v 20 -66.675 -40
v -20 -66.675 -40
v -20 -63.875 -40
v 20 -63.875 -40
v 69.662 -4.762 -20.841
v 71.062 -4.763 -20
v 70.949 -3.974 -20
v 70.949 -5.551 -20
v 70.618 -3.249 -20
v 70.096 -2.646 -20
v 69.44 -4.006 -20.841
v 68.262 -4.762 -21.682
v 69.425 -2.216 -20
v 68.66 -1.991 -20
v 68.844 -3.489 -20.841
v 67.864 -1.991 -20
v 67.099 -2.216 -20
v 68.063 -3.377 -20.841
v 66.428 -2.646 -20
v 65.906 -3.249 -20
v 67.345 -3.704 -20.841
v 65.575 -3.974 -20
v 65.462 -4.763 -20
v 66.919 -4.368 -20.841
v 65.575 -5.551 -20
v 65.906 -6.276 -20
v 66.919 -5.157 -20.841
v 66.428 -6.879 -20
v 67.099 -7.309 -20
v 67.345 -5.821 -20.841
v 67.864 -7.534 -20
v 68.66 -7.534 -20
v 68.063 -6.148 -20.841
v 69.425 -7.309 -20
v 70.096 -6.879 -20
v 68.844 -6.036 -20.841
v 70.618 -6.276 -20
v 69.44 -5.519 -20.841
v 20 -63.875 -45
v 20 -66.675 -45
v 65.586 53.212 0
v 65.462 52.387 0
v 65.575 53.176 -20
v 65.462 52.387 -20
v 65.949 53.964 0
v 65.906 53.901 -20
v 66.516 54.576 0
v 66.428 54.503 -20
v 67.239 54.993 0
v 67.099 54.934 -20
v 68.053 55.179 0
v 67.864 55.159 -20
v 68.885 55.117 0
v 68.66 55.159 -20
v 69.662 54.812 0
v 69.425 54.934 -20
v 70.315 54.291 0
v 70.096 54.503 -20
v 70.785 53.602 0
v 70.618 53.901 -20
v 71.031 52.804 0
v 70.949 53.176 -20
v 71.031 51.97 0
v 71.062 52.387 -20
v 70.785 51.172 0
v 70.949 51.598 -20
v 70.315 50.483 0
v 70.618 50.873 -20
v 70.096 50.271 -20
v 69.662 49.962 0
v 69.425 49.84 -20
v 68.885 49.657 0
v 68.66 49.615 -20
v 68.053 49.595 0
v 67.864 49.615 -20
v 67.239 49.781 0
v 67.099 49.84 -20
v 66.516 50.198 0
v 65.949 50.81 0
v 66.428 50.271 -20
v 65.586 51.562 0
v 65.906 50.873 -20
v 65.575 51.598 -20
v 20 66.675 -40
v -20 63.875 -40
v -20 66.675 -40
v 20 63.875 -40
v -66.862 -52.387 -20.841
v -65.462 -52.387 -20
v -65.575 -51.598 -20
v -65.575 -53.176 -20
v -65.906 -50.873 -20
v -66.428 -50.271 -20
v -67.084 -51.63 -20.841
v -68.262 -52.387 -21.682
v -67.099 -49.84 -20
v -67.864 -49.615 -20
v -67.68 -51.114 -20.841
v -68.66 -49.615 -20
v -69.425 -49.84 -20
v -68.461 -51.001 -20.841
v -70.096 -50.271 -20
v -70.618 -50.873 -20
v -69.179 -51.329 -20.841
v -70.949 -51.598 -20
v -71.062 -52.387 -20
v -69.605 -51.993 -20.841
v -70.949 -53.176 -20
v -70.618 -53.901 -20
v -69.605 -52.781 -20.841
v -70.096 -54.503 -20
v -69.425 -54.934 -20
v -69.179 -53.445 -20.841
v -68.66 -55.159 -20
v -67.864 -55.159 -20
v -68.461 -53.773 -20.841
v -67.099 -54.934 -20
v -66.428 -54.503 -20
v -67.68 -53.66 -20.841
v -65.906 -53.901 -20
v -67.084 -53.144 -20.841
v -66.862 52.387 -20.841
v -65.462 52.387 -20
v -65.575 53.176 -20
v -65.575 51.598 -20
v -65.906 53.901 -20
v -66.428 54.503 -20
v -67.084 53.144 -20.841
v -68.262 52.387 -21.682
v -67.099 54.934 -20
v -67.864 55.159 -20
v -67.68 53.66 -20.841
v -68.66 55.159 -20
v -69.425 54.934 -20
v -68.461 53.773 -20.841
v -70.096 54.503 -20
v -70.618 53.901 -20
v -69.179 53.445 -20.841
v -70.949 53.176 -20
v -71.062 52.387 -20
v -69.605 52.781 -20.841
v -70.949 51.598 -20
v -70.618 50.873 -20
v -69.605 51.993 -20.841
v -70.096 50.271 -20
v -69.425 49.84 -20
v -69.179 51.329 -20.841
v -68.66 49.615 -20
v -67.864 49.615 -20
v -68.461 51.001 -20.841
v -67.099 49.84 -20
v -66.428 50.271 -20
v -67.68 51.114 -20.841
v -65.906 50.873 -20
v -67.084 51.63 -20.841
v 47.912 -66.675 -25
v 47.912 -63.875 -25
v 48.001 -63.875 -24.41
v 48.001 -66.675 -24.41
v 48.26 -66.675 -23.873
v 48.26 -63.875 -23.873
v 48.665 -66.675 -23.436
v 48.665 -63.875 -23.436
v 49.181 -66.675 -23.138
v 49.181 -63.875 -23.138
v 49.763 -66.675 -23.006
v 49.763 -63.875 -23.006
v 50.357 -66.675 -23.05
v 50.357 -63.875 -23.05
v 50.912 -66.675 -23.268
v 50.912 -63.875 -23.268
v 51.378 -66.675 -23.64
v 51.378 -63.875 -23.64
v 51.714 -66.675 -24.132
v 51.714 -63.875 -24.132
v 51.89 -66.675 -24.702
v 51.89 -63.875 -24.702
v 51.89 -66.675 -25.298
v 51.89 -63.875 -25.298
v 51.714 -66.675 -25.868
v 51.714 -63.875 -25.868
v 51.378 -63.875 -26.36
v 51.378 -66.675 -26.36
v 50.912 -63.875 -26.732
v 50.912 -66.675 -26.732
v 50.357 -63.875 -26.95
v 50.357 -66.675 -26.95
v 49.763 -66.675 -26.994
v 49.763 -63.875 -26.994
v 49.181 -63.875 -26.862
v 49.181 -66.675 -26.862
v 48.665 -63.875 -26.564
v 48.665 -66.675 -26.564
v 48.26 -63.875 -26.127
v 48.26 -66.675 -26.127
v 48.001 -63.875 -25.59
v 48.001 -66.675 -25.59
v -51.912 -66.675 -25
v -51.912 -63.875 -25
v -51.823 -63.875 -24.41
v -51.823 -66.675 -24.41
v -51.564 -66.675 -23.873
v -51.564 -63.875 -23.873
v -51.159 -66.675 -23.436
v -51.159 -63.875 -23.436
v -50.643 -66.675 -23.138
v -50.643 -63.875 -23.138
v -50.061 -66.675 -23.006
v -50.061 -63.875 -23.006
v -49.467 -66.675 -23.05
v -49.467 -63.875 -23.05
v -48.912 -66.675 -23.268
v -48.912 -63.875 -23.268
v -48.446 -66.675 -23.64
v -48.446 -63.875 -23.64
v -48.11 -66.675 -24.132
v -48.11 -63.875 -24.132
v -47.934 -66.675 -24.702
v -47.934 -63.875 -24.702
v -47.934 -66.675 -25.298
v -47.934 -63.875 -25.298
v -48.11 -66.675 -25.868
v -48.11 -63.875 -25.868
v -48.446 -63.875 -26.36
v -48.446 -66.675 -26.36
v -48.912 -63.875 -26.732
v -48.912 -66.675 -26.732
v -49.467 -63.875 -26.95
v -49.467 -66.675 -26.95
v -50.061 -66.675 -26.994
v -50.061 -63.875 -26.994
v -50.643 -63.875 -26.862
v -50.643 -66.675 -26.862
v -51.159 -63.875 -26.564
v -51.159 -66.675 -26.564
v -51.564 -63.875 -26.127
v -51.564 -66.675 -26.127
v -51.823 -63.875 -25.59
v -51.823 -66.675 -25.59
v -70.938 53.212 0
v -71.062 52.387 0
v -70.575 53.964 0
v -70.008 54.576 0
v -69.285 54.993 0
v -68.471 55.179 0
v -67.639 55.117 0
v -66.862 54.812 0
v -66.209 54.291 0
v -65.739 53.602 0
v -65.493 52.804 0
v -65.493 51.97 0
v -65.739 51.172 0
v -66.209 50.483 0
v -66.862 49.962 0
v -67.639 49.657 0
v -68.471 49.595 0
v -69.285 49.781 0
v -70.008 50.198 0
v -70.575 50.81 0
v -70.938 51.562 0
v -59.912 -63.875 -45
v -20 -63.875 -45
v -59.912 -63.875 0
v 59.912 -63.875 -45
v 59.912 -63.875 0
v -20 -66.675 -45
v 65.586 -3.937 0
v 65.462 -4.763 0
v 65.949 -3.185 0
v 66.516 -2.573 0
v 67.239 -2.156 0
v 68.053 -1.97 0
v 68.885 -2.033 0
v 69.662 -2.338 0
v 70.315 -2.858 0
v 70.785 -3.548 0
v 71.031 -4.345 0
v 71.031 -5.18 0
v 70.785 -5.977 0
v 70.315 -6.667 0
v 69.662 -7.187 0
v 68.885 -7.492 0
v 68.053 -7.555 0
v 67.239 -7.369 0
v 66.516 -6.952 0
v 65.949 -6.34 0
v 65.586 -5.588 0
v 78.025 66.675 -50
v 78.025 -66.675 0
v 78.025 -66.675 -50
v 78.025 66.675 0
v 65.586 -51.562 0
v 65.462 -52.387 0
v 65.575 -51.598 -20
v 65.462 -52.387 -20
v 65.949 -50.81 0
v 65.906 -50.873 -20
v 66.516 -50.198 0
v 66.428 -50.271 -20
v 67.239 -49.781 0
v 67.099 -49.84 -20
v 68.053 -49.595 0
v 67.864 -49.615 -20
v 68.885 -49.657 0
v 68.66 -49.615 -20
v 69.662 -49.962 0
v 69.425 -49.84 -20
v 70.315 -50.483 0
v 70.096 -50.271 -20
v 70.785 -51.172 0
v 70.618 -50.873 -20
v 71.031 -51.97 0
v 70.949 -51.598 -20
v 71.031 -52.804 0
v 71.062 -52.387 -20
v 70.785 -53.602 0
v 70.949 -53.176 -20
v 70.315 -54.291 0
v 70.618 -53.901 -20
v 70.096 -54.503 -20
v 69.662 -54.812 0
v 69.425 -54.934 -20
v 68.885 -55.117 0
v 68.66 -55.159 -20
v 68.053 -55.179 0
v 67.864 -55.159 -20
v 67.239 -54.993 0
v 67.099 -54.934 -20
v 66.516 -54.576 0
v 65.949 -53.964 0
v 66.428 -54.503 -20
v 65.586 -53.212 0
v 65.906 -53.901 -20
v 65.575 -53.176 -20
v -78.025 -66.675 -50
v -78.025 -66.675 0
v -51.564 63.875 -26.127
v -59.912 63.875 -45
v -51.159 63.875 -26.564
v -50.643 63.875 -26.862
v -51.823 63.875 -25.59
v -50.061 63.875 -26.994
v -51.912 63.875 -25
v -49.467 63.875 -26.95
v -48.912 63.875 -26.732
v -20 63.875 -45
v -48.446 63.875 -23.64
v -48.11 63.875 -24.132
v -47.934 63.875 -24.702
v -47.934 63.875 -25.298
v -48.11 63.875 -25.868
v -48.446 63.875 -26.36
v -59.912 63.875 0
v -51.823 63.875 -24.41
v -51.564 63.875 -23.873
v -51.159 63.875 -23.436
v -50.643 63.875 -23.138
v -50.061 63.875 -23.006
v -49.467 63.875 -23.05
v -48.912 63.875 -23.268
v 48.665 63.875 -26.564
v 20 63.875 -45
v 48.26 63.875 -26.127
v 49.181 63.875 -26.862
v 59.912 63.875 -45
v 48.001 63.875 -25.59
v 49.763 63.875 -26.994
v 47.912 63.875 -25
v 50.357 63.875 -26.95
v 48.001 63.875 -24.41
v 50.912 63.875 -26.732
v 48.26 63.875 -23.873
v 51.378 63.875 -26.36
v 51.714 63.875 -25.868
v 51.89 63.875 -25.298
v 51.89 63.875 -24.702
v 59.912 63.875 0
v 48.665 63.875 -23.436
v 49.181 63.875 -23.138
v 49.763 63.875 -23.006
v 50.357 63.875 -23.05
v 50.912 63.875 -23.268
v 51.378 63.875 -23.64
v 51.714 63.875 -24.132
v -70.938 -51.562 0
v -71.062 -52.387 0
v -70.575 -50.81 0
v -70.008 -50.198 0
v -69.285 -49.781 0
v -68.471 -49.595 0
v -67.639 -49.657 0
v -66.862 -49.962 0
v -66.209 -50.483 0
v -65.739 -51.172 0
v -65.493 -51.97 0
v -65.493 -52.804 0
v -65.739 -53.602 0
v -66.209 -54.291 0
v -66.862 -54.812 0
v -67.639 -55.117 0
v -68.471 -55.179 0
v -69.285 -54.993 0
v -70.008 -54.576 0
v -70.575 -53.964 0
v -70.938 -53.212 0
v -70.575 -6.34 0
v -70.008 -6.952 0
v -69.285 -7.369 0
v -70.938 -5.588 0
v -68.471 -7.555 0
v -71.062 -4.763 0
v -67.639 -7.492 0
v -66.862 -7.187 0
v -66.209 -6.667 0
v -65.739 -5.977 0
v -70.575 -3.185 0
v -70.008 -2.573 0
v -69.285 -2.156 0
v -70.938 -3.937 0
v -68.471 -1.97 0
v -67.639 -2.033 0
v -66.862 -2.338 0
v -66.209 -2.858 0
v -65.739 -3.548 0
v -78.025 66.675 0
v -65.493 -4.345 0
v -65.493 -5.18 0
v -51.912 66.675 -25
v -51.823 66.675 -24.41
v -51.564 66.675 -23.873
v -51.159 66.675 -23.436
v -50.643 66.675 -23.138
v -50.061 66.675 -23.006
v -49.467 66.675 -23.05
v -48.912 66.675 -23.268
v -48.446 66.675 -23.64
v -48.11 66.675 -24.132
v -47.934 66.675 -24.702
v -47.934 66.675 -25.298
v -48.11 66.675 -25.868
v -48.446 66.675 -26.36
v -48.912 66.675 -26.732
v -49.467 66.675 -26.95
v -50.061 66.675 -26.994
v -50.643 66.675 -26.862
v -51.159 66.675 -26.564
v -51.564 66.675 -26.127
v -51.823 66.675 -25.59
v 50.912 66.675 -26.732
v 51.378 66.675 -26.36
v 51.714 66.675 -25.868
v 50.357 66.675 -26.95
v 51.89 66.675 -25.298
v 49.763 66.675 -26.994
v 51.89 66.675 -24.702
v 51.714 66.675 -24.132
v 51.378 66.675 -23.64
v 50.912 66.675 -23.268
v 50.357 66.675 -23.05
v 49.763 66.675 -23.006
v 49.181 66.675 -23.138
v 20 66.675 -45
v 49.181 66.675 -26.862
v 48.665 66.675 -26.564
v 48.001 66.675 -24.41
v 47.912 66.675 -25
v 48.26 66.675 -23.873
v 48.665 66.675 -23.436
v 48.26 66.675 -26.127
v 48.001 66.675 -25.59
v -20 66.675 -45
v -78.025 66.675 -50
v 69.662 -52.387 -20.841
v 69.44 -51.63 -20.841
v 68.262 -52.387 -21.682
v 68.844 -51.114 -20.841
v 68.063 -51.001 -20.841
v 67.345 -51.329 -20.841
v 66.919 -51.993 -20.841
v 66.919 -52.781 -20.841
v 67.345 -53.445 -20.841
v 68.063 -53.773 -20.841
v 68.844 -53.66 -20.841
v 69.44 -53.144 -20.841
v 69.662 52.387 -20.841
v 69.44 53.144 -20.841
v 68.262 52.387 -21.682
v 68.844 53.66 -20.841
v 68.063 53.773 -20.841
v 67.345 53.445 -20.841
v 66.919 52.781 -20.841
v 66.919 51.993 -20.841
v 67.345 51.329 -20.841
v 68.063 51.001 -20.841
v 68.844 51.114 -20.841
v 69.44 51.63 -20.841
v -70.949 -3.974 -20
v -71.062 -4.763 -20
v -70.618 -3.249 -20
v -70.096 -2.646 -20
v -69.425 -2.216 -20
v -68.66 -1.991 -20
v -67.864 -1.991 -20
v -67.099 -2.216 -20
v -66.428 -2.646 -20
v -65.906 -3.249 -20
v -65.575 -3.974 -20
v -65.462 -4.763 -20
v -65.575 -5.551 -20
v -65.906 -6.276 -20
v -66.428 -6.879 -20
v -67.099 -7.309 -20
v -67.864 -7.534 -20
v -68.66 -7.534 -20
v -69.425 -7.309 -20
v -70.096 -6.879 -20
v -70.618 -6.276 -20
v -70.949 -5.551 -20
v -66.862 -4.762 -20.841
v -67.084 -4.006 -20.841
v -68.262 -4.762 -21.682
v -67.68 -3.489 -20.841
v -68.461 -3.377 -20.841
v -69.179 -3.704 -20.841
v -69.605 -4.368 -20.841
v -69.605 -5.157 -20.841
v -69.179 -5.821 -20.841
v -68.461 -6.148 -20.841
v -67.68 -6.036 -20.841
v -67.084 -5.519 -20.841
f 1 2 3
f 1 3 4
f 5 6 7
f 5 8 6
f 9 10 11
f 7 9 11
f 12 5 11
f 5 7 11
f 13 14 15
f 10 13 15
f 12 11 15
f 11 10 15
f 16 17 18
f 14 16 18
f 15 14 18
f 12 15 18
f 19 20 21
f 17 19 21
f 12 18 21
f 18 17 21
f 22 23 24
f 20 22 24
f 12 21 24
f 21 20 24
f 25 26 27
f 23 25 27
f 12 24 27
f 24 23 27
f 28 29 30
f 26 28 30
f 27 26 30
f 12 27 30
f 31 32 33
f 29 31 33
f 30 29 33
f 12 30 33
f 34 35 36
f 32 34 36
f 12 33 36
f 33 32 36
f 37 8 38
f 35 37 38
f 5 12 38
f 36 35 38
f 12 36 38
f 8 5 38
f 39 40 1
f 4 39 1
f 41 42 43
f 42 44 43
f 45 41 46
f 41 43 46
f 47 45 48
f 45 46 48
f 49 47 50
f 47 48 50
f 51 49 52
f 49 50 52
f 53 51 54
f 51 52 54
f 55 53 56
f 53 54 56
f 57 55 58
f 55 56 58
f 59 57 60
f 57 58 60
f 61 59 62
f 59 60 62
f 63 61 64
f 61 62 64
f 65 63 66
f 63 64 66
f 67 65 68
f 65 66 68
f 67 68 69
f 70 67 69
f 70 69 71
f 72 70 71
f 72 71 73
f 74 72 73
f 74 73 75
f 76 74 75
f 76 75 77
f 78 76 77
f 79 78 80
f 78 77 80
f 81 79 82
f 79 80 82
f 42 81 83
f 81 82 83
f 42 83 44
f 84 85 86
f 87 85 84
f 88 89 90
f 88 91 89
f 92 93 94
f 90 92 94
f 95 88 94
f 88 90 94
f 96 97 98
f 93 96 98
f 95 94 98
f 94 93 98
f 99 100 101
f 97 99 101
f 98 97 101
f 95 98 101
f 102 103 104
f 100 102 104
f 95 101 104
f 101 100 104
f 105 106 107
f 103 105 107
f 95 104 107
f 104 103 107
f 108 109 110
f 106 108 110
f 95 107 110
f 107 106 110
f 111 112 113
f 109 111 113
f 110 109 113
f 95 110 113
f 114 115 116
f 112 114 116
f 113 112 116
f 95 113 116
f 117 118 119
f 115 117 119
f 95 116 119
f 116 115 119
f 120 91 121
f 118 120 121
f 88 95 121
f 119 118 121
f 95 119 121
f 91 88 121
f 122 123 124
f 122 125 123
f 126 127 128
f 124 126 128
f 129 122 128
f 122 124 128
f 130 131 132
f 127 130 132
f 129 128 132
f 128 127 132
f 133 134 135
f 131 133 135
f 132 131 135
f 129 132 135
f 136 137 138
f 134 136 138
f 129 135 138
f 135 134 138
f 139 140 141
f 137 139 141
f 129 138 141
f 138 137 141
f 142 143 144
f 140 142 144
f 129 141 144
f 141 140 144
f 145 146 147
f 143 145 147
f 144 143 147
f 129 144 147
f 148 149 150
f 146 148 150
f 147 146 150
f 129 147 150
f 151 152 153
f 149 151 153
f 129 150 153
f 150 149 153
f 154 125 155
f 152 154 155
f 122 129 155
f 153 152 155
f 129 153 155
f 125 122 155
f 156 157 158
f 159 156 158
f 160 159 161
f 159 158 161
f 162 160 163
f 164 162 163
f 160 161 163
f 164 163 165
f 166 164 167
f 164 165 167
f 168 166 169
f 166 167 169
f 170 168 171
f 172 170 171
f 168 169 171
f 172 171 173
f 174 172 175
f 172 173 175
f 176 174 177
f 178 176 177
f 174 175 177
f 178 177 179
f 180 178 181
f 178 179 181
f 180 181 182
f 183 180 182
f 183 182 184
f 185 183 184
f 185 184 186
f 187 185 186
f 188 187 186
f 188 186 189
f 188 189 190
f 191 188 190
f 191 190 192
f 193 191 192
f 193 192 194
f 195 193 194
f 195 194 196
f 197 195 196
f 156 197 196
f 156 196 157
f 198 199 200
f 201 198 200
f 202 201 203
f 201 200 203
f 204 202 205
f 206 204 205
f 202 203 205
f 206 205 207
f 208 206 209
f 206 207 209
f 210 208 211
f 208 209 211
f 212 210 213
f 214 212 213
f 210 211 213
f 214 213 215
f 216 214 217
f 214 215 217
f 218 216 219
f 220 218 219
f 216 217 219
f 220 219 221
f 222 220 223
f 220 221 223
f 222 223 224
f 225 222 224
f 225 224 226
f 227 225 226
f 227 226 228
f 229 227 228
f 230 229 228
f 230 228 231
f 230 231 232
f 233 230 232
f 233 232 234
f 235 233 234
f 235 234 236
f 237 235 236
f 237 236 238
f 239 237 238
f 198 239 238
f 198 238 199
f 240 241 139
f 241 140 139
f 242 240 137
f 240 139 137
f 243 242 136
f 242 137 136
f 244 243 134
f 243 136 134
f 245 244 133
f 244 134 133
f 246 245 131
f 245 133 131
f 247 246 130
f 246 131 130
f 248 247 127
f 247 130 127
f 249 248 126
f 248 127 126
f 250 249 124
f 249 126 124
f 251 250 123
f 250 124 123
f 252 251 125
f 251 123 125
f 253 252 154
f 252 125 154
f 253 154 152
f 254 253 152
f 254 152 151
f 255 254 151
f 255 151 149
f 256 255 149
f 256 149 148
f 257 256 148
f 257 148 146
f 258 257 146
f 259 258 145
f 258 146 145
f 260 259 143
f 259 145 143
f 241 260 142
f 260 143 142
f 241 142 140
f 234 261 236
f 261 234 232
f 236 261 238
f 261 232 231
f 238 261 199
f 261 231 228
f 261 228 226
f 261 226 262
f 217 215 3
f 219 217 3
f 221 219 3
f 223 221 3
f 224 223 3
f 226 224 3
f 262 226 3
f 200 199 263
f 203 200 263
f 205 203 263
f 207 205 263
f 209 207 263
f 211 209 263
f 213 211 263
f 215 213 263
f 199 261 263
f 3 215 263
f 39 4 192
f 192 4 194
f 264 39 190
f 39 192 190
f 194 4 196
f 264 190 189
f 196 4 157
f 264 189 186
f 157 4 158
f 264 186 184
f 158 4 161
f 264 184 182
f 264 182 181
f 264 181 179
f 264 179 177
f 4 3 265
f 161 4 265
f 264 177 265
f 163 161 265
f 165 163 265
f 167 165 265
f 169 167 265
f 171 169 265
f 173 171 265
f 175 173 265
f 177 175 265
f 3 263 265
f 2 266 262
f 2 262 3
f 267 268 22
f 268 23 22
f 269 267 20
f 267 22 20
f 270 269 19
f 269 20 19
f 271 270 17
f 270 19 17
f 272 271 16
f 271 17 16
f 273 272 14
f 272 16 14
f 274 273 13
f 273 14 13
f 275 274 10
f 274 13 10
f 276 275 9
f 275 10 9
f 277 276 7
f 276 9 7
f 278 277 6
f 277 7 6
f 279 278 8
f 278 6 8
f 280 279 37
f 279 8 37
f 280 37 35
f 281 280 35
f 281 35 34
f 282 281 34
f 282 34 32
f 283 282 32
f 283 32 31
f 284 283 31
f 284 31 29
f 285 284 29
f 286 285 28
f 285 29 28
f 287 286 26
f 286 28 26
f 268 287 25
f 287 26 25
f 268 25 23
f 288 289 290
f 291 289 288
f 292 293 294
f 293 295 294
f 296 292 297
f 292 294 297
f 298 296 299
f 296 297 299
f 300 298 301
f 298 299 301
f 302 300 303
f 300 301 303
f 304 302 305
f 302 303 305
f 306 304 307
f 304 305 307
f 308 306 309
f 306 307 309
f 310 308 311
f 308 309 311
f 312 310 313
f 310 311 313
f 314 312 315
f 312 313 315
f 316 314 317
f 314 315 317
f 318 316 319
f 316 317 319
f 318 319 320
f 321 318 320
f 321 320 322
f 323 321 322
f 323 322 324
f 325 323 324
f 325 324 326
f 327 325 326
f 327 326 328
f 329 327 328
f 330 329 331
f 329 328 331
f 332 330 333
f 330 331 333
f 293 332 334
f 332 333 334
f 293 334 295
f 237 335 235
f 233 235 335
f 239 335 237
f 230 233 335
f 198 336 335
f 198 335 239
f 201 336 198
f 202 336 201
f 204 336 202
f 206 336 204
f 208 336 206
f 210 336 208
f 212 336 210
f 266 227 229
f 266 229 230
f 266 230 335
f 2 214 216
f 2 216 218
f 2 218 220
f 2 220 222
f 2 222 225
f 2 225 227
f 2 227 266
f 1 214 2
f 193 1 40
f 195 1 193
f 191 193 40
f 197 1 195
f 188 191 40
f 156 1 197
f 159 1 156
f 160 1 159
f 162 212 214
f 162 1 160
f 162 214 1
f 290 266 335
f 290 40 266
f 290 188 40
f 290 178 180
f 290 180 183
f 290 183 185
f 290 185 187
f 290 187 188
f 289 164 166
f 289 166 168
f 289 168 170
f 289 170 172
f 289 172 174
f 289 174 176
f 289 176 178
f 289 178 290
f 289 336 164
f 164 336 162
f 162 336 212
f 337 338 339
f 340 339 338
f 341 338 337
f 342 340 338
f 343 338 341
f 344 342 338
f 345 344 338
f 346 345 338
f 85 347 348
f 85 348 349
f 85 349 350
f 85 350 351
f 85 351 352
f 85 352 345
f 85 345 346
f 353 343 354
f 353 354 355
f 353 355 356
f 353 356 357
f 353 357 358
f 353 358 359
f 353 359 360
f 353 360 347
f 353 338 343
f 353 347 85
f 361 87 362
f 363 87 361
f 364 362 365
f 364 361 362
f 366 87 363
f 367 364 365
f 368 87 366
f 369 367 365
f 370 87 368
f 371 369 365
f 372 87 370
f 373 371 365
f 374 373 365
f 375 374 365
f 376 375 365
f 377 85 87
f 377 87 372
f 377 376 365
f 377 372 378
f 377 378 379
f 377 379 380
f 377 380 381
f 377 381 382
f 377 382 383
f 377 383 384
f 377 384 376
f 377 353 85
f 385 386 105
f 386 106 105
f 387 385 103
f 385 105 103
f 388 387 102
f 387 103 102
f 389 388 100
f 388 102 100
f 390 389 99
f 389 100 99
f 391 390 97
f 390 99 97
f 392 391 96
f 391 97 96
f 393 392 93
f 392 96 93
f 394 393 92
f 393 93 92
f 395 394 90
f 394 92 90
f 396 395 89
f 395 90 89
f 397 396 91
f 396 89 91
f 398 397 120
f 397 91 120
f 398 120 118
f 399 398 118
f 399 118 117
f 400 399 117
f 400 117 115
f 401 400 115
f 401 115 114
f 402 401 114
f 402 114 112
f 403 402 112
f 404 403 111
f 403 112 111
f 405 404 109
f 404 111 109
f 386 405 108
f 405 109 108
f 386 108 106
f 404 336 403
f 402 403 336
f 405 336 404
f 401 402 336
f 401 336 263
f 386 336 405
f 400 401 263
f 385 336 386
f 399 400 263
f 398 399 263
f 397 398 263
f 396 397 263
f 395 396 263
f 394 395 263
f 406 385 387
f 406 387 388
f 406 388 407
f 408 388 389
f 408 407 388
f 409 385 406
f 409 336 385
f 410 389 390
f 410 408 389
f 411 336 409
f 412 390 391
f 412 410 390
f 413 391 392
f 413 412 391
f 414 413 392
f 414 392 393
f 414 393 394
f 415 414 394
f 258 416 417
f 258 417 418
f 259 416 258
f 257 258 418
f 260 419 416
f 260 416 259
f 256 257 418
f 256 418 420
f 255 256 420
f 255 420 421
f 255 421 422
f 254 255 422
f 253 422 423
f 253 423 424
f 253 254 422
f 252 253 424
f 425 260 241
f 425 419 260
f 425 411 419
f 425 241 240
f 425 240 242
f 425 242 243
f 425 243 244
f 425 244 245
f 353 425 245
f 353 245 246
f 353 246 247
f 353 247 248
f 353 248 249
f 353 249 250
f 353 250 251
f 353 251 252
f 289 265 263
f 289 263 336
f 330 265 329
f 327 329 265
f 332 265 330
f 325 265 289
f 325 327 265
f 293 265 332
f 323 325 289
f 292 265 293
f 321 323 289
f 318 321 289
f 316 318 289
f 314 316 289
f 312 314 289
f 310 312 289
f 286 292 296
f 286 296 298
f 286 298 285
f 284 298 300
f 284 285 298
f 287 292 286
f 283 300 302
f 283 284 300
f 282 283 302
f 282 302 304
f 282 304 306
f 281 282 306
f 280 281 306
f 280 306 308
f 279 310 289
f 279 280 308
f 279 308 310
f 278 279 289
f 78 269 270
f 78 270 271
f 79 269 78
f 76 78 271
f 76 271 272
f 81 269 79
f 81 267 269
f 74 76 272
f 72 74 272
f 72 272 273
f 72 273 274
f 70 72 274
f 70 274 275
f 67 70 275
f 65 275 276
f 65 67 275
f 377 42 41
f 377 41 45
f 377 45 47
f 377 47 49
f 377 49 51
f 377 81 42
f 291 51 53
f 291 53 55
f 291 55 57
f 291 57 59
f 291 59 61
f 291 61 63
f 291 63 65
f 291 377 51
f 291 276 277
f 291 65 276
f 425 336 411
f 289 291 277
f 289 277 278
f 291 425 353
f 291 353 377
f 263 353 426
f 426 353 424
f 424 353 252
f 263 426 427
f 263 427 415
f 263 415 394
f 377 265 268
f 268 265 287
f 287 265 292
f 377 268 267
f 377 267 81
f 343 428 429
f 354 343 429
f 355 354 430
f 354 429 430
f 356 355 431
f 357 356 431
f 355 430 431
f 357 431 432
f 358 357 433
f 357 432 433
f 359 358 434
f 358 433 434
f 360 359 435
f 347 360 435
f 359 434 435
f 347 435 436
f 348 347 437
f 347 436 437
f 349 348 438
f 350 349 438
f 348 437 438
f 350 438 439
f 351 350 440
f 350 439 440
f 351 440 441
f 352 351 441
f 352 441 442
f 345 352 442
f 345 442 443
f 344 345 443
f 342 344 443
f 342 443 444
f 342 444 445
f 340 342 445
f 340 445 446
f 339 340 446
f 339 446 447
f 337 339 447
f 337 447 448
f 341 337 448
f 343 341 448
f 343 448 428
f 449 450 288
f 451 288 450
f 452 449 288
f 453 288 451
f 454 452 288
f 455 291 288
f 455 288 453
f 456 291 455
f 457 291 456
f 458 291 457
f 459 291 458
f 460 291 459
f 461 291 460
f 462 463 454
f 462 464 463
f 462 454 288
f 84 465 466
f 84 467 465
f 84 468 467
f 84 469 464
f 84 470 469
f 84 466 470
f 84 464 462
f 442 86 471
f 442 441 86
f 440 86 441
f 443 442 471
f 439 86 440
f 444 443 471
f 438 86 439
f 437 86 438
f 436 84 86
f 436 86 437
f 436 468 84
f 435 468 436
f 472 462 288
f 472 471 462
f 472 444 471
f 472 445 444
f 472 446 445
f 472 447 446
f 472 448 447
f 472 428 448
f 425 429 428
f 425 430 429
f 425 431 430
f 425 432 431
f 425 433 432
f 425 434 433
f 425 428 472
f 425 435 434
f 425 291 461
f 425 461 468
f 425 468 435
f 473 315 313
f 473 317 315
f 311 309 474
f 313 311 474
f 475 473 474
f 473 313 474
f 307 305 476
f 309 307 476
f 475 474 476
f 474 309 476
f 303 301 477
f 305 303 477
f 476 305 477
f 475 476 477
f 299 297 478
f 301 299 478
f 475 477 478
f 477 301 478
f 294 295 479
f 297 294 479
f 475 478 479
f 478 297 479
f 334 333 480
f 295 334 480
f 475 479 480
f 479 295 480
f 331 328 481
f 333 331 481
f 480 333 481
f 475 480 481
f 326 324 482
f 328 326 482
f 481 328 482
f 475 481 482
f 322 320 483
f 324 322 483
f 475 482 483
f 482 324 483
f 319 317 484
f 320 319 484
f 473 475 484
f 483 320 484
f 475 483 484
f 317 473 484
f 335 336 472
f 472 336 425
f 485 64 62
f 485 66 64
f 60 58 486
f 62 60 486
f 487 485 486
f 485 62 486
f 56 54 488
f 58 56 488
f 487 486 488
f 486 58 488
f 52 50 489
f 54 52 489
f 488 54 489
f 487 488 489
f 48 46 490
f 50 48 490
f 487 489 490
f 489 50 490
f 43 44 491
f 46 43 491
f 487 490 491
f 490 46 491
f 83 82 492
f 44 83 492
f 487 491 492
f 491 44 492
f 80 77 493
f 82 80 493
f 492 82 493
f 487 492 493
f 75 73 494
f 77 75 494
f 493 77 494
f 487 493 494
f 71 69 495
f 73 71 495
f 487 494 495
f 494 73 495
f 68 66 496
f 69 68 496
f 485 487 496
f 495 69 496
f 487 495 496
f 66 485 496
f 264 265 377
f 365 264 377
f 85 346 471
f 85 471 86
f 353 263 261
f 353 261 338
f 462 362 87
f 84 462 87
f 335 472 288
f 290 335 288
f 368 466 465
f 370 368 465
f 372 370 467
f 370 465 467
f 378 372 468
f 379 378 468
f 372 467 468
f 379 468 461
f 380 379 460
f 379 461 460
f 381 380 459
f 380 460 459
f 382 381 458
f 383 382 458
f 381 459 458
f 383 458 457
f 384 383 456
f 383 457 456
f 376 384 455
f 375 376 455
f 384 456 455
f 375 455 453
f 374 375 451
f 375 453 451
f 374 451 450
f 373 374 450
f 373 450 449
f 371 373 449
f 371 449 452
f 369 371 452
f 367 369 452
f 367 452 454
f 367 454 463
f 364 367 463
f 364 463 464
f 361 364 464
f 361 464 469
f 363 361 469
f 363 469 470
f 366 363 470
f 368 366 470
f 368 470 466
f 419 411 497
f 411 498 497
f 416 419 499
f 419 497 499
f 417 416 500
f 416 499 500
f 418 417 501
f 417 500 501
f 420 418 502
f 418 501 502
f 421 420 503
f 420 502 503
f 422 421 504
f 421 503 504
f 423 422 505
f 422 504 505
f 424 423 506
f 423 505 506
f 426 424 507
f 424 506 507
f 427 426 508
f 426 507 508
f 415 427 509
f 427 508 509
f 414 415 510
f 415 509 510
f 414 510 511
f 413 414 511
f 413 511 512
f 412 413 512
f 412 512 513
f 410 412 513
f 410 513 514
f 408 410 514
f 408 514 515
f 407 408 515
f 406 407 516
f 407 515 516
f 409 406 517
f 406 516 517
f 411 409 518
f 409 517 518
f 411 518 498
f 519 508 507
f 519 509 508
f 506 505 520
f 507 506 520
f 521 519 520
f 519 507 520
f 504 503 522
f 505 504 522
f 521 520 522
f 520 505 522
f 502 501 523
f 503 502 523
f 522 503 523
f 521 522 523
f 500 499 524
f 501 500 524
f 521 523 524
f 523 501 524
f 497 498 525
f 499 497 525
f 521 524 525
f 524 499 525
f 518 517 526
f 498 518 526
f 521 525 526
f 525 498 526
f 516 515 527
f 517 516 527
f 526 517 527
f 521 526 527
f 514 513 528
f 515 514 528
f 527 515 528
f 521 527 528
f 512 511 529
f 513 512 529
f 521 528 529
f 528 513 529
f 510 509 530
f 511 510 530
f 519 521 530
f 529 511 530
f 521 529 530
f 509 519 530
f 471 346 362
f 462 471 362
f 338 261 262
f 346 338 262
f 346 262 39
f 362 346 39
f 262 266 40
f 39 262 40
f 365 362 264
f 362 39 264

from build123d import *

# Parameters (mm, degrees)
F0_W     = 146.05
F0_H     = 133.35
F0_R     = 3.24
F0_W_2   = 5
F1_DEPTH = 50
F2_D     = 5.6
F2_DEPTH = 20
F2_TIP   = 1.6824097333
F3_W     = 119.824
F3_H     = 127.75
F4_DEPTH = 45
F5_W     = 40
F5_H     = 5
F6_DEPTH = 133.351
F7_D     = 4


with BuildPart() as f1:
    # F0 (on Top) → F1 (new body)
    with BuildSketch(Plane.XY):
        Rectangle(F0_W, F0_H)
        with Locations((-68.262, -52.387)):
            Circle(F0_R, mode=Mode.SUBTRACT)
        with Locations((-68.262, -4.7625)):
            Circle(F0_R, mode=Mode.SUBTRACT)
        with Locations((68.262, -52.387)):
            Circle(F0_R, mode=Mode.SUBTRACT)
        with Locations((68.262, -4.7625)):
            Circle(F0_R, mode=Mode.SUBTRACT)
        with BuildLine():
            Line((72.225, 46.037), (72.225, 1.5875))
            Line((72.225, 1.5875), (68.262, 1.5875))
            ThreePointArc((68.262, 1.5875), (61.912, -4.7625), (68.262, -11.1125))
            Line((68.262, -11.1125), (72.225, -11.1125))
            Line((72.225, -11.1125), (72.225, -46.037))
            Line((72.225, -46.037), (68.262, -46.037))
            ThreePointArc((68.262, -46.037), (61.912, -52.387), (68.262, -58.737))
            Line((68.262, -58.737), (72.225, -58.737))
            Line((72.225, -58.737), (72.225, -65.875))
            Line((72.225, -65.875), (-72.225, -65.875))
            Line((-72.225, -65.875), (-72.225, -58.737))
            Line((-72.225, -58.737), (-68.262, -58.737))
            ThreePointArc((-68.262, -58.737), (-61.912, -52.387), (-68.262, -46.037))
            Line((-68.262, -46.037), (-72.225, -46.037))
            Line((-72.225, -46.037), (-72.225, -11.1125))
            Line((-72.225, -11.1125), (-68.262, -11.1125))
            ThreePointArc((-68.262, -11.1125), (-61.912, -4.7625), (-68.262, 1.5875))
            Line((-68.262, 1.5875), (-72.225, 1.5875))
            Line((-72.225, 1.5875), (-72.225, 46.037))
            Line((-72.225, 46.037), (-68.262, 46.037))
            ThreePointArc((-68.262, 46.037), (-61.912, 52.387), (-68.262, 58.737))
            Line((-68.262, 58.737), (-72.225, 58.737))
            Line((-72.225, 58.737), (-72.225, 65.875))
            Line((-72.225, 65.875), (72.225, 65.875))
            Line((72.225, 65.875), (72.225, 58.737))
            Line((72.225, 58.737), (68.262, 58.737))
            ThreePointArc((68.262, 58.737), (61.912, 52.387), (68.262, 46.037))
            Line((68.262, 46.037), (72.225, 46.037))
        make_face(mode=Mode.SUBTRACT)
        with Locations((-68.262, 52.387)):
            Circle(F0_R, mode=Mode.SUBTRACT)
        with Locations((68.262, 52.387)):
            Circle(F0_R, mode=Mode.SUBTRACT)
        with BuildLine():
            Line((68.262, 1.5875), (72.225, 1.5875))
            Line((72.225, 1.5875), (72.225, 46.037))
            Line((72.225, 46.037), (68.262, 46.037))
            ThreePointArc((68.262, 46.037), (61.912, 52.387), (68.262, 58.737))
            Line((68.262, 58.737), (72.225, 58.737))
            Line((72.225, 58.737), (72.225, 65.875))
            Line((72.225, 65.875), (-72.225, 65.875))
            Line((-72.225, 65.875), (-72.225, 58.737))
            Line((-72.225, 58.737), (-68.262, 58.737))
            ThreePointArc((-68.262, 58.737), (-61.912, 52.387), (-68.262, 46.037))
            Line((-68.262, 46.037), (-72.225, 46.037))
            Line((-72.225, 46.037), (-72.225, 1.5875))
            Line((-72.225, 1.5875), (-68.262, 1.5875))
            ThreePointArc((-68.262, 1.5875), (-61.912, -4.7625), (-68.262, -11.1125))
            Line((-68.262, -11.1125), (-72.225, -11.1125))
            Line((-72.225, -11.1125), (-72.225, -46.037))
            Line((-72.225, -46.037), (-68.262, -46.037))
            ThreePointArc((-68.262, -46.037), (-61.912, -52.387), (-68.262, -58.737))
            Line((-68.262, -58.737), (-72.225, -58.737))
            Line((-72.225, -58.737), (-72.225, -65.875))
            Line((-72.225, -65.875), (72.225, -65.875))
            Line((72.225, -65.875), (72.225, -58.737))
            Line((72.225, -58.737), (68.262, -58.737))
            ThreePointArc((68.262, -58.737), (61.912, -52.387), (68.262, -46.037))
            Line((68.262, -46.037), (72.225, -46.037))
            Line((72.225, -46.037), (72.225, -11.1125))
            Line((72.225, -11.1125), (68.262, -11.1125))
            ThreePointArc((68.262, -11.1125), (61.912, -4.7625), (68.262, 1.5875))
        make_face()
        with Locations((-75.525, 0)):
            Rectangle(F0_W_2, F0_H)
        with Locations((75.525, 0)):
            Rectangle(F0_W_2, F0_H)
        with Locations((-68.262, 52.387)):
            Circle(F0_R)
        with Locations((-68.262, -4.7625)):
            Circle(F0_R)
        with Locations((-68.262, -52.387)):
            Circle(F0_R)
        with Locations((68.262, -52.387)):
            Circle(F0_R)
        with Locations((68.262, -4.7625)):
            Circle(F0_R)
        with Locations((68.262, 52.387)):
            Circle(F0_R)
    extrude(amount=-F1_DEPTH)

    # F2
    with Locations(Plane.XY):
        with Locations((-68.262, 52.387), (-68.262, -4.7625), (-68.262, -52.387), (68.262, -52.387), (68.262, -4.7625), (68.262, 52.387)):
            Hole(F2_D / 2, depth=F2_DEPTH)
            with Locations((0, 0, -(F2_DEPTH + F2_TIP / 2))):  # 118° drill point
                Cone(0, F2_D / 2, F2_TIP, mode=Mode.SUBTRACT)

    # F3 (on face) → F4 (cut)
    with BuildSketch(Plane.XY):
        Rectangle(F3_W, F3_H)
    extrude(amount=-F4_DEPTH, mode=Mode.SUBTRACT)

    # F5 (on face) → F6 (cut, through all)
    with BuildSketch(Plane.XZ.offset(66.675)):
        with Locations((0, -42.5)):
            Rectangle(F5_W, F5_H)
    extrude(amount=-F6_DEPTH, mode=Mode.SUBTRACT)

    # F7 (through all)
    with Locations(Plane.XZ.offset(66.675)):
        with Locations((-49.912, -25), (49.912, -25)):
            Hole(F7_D / 2)


solid = f1.part
